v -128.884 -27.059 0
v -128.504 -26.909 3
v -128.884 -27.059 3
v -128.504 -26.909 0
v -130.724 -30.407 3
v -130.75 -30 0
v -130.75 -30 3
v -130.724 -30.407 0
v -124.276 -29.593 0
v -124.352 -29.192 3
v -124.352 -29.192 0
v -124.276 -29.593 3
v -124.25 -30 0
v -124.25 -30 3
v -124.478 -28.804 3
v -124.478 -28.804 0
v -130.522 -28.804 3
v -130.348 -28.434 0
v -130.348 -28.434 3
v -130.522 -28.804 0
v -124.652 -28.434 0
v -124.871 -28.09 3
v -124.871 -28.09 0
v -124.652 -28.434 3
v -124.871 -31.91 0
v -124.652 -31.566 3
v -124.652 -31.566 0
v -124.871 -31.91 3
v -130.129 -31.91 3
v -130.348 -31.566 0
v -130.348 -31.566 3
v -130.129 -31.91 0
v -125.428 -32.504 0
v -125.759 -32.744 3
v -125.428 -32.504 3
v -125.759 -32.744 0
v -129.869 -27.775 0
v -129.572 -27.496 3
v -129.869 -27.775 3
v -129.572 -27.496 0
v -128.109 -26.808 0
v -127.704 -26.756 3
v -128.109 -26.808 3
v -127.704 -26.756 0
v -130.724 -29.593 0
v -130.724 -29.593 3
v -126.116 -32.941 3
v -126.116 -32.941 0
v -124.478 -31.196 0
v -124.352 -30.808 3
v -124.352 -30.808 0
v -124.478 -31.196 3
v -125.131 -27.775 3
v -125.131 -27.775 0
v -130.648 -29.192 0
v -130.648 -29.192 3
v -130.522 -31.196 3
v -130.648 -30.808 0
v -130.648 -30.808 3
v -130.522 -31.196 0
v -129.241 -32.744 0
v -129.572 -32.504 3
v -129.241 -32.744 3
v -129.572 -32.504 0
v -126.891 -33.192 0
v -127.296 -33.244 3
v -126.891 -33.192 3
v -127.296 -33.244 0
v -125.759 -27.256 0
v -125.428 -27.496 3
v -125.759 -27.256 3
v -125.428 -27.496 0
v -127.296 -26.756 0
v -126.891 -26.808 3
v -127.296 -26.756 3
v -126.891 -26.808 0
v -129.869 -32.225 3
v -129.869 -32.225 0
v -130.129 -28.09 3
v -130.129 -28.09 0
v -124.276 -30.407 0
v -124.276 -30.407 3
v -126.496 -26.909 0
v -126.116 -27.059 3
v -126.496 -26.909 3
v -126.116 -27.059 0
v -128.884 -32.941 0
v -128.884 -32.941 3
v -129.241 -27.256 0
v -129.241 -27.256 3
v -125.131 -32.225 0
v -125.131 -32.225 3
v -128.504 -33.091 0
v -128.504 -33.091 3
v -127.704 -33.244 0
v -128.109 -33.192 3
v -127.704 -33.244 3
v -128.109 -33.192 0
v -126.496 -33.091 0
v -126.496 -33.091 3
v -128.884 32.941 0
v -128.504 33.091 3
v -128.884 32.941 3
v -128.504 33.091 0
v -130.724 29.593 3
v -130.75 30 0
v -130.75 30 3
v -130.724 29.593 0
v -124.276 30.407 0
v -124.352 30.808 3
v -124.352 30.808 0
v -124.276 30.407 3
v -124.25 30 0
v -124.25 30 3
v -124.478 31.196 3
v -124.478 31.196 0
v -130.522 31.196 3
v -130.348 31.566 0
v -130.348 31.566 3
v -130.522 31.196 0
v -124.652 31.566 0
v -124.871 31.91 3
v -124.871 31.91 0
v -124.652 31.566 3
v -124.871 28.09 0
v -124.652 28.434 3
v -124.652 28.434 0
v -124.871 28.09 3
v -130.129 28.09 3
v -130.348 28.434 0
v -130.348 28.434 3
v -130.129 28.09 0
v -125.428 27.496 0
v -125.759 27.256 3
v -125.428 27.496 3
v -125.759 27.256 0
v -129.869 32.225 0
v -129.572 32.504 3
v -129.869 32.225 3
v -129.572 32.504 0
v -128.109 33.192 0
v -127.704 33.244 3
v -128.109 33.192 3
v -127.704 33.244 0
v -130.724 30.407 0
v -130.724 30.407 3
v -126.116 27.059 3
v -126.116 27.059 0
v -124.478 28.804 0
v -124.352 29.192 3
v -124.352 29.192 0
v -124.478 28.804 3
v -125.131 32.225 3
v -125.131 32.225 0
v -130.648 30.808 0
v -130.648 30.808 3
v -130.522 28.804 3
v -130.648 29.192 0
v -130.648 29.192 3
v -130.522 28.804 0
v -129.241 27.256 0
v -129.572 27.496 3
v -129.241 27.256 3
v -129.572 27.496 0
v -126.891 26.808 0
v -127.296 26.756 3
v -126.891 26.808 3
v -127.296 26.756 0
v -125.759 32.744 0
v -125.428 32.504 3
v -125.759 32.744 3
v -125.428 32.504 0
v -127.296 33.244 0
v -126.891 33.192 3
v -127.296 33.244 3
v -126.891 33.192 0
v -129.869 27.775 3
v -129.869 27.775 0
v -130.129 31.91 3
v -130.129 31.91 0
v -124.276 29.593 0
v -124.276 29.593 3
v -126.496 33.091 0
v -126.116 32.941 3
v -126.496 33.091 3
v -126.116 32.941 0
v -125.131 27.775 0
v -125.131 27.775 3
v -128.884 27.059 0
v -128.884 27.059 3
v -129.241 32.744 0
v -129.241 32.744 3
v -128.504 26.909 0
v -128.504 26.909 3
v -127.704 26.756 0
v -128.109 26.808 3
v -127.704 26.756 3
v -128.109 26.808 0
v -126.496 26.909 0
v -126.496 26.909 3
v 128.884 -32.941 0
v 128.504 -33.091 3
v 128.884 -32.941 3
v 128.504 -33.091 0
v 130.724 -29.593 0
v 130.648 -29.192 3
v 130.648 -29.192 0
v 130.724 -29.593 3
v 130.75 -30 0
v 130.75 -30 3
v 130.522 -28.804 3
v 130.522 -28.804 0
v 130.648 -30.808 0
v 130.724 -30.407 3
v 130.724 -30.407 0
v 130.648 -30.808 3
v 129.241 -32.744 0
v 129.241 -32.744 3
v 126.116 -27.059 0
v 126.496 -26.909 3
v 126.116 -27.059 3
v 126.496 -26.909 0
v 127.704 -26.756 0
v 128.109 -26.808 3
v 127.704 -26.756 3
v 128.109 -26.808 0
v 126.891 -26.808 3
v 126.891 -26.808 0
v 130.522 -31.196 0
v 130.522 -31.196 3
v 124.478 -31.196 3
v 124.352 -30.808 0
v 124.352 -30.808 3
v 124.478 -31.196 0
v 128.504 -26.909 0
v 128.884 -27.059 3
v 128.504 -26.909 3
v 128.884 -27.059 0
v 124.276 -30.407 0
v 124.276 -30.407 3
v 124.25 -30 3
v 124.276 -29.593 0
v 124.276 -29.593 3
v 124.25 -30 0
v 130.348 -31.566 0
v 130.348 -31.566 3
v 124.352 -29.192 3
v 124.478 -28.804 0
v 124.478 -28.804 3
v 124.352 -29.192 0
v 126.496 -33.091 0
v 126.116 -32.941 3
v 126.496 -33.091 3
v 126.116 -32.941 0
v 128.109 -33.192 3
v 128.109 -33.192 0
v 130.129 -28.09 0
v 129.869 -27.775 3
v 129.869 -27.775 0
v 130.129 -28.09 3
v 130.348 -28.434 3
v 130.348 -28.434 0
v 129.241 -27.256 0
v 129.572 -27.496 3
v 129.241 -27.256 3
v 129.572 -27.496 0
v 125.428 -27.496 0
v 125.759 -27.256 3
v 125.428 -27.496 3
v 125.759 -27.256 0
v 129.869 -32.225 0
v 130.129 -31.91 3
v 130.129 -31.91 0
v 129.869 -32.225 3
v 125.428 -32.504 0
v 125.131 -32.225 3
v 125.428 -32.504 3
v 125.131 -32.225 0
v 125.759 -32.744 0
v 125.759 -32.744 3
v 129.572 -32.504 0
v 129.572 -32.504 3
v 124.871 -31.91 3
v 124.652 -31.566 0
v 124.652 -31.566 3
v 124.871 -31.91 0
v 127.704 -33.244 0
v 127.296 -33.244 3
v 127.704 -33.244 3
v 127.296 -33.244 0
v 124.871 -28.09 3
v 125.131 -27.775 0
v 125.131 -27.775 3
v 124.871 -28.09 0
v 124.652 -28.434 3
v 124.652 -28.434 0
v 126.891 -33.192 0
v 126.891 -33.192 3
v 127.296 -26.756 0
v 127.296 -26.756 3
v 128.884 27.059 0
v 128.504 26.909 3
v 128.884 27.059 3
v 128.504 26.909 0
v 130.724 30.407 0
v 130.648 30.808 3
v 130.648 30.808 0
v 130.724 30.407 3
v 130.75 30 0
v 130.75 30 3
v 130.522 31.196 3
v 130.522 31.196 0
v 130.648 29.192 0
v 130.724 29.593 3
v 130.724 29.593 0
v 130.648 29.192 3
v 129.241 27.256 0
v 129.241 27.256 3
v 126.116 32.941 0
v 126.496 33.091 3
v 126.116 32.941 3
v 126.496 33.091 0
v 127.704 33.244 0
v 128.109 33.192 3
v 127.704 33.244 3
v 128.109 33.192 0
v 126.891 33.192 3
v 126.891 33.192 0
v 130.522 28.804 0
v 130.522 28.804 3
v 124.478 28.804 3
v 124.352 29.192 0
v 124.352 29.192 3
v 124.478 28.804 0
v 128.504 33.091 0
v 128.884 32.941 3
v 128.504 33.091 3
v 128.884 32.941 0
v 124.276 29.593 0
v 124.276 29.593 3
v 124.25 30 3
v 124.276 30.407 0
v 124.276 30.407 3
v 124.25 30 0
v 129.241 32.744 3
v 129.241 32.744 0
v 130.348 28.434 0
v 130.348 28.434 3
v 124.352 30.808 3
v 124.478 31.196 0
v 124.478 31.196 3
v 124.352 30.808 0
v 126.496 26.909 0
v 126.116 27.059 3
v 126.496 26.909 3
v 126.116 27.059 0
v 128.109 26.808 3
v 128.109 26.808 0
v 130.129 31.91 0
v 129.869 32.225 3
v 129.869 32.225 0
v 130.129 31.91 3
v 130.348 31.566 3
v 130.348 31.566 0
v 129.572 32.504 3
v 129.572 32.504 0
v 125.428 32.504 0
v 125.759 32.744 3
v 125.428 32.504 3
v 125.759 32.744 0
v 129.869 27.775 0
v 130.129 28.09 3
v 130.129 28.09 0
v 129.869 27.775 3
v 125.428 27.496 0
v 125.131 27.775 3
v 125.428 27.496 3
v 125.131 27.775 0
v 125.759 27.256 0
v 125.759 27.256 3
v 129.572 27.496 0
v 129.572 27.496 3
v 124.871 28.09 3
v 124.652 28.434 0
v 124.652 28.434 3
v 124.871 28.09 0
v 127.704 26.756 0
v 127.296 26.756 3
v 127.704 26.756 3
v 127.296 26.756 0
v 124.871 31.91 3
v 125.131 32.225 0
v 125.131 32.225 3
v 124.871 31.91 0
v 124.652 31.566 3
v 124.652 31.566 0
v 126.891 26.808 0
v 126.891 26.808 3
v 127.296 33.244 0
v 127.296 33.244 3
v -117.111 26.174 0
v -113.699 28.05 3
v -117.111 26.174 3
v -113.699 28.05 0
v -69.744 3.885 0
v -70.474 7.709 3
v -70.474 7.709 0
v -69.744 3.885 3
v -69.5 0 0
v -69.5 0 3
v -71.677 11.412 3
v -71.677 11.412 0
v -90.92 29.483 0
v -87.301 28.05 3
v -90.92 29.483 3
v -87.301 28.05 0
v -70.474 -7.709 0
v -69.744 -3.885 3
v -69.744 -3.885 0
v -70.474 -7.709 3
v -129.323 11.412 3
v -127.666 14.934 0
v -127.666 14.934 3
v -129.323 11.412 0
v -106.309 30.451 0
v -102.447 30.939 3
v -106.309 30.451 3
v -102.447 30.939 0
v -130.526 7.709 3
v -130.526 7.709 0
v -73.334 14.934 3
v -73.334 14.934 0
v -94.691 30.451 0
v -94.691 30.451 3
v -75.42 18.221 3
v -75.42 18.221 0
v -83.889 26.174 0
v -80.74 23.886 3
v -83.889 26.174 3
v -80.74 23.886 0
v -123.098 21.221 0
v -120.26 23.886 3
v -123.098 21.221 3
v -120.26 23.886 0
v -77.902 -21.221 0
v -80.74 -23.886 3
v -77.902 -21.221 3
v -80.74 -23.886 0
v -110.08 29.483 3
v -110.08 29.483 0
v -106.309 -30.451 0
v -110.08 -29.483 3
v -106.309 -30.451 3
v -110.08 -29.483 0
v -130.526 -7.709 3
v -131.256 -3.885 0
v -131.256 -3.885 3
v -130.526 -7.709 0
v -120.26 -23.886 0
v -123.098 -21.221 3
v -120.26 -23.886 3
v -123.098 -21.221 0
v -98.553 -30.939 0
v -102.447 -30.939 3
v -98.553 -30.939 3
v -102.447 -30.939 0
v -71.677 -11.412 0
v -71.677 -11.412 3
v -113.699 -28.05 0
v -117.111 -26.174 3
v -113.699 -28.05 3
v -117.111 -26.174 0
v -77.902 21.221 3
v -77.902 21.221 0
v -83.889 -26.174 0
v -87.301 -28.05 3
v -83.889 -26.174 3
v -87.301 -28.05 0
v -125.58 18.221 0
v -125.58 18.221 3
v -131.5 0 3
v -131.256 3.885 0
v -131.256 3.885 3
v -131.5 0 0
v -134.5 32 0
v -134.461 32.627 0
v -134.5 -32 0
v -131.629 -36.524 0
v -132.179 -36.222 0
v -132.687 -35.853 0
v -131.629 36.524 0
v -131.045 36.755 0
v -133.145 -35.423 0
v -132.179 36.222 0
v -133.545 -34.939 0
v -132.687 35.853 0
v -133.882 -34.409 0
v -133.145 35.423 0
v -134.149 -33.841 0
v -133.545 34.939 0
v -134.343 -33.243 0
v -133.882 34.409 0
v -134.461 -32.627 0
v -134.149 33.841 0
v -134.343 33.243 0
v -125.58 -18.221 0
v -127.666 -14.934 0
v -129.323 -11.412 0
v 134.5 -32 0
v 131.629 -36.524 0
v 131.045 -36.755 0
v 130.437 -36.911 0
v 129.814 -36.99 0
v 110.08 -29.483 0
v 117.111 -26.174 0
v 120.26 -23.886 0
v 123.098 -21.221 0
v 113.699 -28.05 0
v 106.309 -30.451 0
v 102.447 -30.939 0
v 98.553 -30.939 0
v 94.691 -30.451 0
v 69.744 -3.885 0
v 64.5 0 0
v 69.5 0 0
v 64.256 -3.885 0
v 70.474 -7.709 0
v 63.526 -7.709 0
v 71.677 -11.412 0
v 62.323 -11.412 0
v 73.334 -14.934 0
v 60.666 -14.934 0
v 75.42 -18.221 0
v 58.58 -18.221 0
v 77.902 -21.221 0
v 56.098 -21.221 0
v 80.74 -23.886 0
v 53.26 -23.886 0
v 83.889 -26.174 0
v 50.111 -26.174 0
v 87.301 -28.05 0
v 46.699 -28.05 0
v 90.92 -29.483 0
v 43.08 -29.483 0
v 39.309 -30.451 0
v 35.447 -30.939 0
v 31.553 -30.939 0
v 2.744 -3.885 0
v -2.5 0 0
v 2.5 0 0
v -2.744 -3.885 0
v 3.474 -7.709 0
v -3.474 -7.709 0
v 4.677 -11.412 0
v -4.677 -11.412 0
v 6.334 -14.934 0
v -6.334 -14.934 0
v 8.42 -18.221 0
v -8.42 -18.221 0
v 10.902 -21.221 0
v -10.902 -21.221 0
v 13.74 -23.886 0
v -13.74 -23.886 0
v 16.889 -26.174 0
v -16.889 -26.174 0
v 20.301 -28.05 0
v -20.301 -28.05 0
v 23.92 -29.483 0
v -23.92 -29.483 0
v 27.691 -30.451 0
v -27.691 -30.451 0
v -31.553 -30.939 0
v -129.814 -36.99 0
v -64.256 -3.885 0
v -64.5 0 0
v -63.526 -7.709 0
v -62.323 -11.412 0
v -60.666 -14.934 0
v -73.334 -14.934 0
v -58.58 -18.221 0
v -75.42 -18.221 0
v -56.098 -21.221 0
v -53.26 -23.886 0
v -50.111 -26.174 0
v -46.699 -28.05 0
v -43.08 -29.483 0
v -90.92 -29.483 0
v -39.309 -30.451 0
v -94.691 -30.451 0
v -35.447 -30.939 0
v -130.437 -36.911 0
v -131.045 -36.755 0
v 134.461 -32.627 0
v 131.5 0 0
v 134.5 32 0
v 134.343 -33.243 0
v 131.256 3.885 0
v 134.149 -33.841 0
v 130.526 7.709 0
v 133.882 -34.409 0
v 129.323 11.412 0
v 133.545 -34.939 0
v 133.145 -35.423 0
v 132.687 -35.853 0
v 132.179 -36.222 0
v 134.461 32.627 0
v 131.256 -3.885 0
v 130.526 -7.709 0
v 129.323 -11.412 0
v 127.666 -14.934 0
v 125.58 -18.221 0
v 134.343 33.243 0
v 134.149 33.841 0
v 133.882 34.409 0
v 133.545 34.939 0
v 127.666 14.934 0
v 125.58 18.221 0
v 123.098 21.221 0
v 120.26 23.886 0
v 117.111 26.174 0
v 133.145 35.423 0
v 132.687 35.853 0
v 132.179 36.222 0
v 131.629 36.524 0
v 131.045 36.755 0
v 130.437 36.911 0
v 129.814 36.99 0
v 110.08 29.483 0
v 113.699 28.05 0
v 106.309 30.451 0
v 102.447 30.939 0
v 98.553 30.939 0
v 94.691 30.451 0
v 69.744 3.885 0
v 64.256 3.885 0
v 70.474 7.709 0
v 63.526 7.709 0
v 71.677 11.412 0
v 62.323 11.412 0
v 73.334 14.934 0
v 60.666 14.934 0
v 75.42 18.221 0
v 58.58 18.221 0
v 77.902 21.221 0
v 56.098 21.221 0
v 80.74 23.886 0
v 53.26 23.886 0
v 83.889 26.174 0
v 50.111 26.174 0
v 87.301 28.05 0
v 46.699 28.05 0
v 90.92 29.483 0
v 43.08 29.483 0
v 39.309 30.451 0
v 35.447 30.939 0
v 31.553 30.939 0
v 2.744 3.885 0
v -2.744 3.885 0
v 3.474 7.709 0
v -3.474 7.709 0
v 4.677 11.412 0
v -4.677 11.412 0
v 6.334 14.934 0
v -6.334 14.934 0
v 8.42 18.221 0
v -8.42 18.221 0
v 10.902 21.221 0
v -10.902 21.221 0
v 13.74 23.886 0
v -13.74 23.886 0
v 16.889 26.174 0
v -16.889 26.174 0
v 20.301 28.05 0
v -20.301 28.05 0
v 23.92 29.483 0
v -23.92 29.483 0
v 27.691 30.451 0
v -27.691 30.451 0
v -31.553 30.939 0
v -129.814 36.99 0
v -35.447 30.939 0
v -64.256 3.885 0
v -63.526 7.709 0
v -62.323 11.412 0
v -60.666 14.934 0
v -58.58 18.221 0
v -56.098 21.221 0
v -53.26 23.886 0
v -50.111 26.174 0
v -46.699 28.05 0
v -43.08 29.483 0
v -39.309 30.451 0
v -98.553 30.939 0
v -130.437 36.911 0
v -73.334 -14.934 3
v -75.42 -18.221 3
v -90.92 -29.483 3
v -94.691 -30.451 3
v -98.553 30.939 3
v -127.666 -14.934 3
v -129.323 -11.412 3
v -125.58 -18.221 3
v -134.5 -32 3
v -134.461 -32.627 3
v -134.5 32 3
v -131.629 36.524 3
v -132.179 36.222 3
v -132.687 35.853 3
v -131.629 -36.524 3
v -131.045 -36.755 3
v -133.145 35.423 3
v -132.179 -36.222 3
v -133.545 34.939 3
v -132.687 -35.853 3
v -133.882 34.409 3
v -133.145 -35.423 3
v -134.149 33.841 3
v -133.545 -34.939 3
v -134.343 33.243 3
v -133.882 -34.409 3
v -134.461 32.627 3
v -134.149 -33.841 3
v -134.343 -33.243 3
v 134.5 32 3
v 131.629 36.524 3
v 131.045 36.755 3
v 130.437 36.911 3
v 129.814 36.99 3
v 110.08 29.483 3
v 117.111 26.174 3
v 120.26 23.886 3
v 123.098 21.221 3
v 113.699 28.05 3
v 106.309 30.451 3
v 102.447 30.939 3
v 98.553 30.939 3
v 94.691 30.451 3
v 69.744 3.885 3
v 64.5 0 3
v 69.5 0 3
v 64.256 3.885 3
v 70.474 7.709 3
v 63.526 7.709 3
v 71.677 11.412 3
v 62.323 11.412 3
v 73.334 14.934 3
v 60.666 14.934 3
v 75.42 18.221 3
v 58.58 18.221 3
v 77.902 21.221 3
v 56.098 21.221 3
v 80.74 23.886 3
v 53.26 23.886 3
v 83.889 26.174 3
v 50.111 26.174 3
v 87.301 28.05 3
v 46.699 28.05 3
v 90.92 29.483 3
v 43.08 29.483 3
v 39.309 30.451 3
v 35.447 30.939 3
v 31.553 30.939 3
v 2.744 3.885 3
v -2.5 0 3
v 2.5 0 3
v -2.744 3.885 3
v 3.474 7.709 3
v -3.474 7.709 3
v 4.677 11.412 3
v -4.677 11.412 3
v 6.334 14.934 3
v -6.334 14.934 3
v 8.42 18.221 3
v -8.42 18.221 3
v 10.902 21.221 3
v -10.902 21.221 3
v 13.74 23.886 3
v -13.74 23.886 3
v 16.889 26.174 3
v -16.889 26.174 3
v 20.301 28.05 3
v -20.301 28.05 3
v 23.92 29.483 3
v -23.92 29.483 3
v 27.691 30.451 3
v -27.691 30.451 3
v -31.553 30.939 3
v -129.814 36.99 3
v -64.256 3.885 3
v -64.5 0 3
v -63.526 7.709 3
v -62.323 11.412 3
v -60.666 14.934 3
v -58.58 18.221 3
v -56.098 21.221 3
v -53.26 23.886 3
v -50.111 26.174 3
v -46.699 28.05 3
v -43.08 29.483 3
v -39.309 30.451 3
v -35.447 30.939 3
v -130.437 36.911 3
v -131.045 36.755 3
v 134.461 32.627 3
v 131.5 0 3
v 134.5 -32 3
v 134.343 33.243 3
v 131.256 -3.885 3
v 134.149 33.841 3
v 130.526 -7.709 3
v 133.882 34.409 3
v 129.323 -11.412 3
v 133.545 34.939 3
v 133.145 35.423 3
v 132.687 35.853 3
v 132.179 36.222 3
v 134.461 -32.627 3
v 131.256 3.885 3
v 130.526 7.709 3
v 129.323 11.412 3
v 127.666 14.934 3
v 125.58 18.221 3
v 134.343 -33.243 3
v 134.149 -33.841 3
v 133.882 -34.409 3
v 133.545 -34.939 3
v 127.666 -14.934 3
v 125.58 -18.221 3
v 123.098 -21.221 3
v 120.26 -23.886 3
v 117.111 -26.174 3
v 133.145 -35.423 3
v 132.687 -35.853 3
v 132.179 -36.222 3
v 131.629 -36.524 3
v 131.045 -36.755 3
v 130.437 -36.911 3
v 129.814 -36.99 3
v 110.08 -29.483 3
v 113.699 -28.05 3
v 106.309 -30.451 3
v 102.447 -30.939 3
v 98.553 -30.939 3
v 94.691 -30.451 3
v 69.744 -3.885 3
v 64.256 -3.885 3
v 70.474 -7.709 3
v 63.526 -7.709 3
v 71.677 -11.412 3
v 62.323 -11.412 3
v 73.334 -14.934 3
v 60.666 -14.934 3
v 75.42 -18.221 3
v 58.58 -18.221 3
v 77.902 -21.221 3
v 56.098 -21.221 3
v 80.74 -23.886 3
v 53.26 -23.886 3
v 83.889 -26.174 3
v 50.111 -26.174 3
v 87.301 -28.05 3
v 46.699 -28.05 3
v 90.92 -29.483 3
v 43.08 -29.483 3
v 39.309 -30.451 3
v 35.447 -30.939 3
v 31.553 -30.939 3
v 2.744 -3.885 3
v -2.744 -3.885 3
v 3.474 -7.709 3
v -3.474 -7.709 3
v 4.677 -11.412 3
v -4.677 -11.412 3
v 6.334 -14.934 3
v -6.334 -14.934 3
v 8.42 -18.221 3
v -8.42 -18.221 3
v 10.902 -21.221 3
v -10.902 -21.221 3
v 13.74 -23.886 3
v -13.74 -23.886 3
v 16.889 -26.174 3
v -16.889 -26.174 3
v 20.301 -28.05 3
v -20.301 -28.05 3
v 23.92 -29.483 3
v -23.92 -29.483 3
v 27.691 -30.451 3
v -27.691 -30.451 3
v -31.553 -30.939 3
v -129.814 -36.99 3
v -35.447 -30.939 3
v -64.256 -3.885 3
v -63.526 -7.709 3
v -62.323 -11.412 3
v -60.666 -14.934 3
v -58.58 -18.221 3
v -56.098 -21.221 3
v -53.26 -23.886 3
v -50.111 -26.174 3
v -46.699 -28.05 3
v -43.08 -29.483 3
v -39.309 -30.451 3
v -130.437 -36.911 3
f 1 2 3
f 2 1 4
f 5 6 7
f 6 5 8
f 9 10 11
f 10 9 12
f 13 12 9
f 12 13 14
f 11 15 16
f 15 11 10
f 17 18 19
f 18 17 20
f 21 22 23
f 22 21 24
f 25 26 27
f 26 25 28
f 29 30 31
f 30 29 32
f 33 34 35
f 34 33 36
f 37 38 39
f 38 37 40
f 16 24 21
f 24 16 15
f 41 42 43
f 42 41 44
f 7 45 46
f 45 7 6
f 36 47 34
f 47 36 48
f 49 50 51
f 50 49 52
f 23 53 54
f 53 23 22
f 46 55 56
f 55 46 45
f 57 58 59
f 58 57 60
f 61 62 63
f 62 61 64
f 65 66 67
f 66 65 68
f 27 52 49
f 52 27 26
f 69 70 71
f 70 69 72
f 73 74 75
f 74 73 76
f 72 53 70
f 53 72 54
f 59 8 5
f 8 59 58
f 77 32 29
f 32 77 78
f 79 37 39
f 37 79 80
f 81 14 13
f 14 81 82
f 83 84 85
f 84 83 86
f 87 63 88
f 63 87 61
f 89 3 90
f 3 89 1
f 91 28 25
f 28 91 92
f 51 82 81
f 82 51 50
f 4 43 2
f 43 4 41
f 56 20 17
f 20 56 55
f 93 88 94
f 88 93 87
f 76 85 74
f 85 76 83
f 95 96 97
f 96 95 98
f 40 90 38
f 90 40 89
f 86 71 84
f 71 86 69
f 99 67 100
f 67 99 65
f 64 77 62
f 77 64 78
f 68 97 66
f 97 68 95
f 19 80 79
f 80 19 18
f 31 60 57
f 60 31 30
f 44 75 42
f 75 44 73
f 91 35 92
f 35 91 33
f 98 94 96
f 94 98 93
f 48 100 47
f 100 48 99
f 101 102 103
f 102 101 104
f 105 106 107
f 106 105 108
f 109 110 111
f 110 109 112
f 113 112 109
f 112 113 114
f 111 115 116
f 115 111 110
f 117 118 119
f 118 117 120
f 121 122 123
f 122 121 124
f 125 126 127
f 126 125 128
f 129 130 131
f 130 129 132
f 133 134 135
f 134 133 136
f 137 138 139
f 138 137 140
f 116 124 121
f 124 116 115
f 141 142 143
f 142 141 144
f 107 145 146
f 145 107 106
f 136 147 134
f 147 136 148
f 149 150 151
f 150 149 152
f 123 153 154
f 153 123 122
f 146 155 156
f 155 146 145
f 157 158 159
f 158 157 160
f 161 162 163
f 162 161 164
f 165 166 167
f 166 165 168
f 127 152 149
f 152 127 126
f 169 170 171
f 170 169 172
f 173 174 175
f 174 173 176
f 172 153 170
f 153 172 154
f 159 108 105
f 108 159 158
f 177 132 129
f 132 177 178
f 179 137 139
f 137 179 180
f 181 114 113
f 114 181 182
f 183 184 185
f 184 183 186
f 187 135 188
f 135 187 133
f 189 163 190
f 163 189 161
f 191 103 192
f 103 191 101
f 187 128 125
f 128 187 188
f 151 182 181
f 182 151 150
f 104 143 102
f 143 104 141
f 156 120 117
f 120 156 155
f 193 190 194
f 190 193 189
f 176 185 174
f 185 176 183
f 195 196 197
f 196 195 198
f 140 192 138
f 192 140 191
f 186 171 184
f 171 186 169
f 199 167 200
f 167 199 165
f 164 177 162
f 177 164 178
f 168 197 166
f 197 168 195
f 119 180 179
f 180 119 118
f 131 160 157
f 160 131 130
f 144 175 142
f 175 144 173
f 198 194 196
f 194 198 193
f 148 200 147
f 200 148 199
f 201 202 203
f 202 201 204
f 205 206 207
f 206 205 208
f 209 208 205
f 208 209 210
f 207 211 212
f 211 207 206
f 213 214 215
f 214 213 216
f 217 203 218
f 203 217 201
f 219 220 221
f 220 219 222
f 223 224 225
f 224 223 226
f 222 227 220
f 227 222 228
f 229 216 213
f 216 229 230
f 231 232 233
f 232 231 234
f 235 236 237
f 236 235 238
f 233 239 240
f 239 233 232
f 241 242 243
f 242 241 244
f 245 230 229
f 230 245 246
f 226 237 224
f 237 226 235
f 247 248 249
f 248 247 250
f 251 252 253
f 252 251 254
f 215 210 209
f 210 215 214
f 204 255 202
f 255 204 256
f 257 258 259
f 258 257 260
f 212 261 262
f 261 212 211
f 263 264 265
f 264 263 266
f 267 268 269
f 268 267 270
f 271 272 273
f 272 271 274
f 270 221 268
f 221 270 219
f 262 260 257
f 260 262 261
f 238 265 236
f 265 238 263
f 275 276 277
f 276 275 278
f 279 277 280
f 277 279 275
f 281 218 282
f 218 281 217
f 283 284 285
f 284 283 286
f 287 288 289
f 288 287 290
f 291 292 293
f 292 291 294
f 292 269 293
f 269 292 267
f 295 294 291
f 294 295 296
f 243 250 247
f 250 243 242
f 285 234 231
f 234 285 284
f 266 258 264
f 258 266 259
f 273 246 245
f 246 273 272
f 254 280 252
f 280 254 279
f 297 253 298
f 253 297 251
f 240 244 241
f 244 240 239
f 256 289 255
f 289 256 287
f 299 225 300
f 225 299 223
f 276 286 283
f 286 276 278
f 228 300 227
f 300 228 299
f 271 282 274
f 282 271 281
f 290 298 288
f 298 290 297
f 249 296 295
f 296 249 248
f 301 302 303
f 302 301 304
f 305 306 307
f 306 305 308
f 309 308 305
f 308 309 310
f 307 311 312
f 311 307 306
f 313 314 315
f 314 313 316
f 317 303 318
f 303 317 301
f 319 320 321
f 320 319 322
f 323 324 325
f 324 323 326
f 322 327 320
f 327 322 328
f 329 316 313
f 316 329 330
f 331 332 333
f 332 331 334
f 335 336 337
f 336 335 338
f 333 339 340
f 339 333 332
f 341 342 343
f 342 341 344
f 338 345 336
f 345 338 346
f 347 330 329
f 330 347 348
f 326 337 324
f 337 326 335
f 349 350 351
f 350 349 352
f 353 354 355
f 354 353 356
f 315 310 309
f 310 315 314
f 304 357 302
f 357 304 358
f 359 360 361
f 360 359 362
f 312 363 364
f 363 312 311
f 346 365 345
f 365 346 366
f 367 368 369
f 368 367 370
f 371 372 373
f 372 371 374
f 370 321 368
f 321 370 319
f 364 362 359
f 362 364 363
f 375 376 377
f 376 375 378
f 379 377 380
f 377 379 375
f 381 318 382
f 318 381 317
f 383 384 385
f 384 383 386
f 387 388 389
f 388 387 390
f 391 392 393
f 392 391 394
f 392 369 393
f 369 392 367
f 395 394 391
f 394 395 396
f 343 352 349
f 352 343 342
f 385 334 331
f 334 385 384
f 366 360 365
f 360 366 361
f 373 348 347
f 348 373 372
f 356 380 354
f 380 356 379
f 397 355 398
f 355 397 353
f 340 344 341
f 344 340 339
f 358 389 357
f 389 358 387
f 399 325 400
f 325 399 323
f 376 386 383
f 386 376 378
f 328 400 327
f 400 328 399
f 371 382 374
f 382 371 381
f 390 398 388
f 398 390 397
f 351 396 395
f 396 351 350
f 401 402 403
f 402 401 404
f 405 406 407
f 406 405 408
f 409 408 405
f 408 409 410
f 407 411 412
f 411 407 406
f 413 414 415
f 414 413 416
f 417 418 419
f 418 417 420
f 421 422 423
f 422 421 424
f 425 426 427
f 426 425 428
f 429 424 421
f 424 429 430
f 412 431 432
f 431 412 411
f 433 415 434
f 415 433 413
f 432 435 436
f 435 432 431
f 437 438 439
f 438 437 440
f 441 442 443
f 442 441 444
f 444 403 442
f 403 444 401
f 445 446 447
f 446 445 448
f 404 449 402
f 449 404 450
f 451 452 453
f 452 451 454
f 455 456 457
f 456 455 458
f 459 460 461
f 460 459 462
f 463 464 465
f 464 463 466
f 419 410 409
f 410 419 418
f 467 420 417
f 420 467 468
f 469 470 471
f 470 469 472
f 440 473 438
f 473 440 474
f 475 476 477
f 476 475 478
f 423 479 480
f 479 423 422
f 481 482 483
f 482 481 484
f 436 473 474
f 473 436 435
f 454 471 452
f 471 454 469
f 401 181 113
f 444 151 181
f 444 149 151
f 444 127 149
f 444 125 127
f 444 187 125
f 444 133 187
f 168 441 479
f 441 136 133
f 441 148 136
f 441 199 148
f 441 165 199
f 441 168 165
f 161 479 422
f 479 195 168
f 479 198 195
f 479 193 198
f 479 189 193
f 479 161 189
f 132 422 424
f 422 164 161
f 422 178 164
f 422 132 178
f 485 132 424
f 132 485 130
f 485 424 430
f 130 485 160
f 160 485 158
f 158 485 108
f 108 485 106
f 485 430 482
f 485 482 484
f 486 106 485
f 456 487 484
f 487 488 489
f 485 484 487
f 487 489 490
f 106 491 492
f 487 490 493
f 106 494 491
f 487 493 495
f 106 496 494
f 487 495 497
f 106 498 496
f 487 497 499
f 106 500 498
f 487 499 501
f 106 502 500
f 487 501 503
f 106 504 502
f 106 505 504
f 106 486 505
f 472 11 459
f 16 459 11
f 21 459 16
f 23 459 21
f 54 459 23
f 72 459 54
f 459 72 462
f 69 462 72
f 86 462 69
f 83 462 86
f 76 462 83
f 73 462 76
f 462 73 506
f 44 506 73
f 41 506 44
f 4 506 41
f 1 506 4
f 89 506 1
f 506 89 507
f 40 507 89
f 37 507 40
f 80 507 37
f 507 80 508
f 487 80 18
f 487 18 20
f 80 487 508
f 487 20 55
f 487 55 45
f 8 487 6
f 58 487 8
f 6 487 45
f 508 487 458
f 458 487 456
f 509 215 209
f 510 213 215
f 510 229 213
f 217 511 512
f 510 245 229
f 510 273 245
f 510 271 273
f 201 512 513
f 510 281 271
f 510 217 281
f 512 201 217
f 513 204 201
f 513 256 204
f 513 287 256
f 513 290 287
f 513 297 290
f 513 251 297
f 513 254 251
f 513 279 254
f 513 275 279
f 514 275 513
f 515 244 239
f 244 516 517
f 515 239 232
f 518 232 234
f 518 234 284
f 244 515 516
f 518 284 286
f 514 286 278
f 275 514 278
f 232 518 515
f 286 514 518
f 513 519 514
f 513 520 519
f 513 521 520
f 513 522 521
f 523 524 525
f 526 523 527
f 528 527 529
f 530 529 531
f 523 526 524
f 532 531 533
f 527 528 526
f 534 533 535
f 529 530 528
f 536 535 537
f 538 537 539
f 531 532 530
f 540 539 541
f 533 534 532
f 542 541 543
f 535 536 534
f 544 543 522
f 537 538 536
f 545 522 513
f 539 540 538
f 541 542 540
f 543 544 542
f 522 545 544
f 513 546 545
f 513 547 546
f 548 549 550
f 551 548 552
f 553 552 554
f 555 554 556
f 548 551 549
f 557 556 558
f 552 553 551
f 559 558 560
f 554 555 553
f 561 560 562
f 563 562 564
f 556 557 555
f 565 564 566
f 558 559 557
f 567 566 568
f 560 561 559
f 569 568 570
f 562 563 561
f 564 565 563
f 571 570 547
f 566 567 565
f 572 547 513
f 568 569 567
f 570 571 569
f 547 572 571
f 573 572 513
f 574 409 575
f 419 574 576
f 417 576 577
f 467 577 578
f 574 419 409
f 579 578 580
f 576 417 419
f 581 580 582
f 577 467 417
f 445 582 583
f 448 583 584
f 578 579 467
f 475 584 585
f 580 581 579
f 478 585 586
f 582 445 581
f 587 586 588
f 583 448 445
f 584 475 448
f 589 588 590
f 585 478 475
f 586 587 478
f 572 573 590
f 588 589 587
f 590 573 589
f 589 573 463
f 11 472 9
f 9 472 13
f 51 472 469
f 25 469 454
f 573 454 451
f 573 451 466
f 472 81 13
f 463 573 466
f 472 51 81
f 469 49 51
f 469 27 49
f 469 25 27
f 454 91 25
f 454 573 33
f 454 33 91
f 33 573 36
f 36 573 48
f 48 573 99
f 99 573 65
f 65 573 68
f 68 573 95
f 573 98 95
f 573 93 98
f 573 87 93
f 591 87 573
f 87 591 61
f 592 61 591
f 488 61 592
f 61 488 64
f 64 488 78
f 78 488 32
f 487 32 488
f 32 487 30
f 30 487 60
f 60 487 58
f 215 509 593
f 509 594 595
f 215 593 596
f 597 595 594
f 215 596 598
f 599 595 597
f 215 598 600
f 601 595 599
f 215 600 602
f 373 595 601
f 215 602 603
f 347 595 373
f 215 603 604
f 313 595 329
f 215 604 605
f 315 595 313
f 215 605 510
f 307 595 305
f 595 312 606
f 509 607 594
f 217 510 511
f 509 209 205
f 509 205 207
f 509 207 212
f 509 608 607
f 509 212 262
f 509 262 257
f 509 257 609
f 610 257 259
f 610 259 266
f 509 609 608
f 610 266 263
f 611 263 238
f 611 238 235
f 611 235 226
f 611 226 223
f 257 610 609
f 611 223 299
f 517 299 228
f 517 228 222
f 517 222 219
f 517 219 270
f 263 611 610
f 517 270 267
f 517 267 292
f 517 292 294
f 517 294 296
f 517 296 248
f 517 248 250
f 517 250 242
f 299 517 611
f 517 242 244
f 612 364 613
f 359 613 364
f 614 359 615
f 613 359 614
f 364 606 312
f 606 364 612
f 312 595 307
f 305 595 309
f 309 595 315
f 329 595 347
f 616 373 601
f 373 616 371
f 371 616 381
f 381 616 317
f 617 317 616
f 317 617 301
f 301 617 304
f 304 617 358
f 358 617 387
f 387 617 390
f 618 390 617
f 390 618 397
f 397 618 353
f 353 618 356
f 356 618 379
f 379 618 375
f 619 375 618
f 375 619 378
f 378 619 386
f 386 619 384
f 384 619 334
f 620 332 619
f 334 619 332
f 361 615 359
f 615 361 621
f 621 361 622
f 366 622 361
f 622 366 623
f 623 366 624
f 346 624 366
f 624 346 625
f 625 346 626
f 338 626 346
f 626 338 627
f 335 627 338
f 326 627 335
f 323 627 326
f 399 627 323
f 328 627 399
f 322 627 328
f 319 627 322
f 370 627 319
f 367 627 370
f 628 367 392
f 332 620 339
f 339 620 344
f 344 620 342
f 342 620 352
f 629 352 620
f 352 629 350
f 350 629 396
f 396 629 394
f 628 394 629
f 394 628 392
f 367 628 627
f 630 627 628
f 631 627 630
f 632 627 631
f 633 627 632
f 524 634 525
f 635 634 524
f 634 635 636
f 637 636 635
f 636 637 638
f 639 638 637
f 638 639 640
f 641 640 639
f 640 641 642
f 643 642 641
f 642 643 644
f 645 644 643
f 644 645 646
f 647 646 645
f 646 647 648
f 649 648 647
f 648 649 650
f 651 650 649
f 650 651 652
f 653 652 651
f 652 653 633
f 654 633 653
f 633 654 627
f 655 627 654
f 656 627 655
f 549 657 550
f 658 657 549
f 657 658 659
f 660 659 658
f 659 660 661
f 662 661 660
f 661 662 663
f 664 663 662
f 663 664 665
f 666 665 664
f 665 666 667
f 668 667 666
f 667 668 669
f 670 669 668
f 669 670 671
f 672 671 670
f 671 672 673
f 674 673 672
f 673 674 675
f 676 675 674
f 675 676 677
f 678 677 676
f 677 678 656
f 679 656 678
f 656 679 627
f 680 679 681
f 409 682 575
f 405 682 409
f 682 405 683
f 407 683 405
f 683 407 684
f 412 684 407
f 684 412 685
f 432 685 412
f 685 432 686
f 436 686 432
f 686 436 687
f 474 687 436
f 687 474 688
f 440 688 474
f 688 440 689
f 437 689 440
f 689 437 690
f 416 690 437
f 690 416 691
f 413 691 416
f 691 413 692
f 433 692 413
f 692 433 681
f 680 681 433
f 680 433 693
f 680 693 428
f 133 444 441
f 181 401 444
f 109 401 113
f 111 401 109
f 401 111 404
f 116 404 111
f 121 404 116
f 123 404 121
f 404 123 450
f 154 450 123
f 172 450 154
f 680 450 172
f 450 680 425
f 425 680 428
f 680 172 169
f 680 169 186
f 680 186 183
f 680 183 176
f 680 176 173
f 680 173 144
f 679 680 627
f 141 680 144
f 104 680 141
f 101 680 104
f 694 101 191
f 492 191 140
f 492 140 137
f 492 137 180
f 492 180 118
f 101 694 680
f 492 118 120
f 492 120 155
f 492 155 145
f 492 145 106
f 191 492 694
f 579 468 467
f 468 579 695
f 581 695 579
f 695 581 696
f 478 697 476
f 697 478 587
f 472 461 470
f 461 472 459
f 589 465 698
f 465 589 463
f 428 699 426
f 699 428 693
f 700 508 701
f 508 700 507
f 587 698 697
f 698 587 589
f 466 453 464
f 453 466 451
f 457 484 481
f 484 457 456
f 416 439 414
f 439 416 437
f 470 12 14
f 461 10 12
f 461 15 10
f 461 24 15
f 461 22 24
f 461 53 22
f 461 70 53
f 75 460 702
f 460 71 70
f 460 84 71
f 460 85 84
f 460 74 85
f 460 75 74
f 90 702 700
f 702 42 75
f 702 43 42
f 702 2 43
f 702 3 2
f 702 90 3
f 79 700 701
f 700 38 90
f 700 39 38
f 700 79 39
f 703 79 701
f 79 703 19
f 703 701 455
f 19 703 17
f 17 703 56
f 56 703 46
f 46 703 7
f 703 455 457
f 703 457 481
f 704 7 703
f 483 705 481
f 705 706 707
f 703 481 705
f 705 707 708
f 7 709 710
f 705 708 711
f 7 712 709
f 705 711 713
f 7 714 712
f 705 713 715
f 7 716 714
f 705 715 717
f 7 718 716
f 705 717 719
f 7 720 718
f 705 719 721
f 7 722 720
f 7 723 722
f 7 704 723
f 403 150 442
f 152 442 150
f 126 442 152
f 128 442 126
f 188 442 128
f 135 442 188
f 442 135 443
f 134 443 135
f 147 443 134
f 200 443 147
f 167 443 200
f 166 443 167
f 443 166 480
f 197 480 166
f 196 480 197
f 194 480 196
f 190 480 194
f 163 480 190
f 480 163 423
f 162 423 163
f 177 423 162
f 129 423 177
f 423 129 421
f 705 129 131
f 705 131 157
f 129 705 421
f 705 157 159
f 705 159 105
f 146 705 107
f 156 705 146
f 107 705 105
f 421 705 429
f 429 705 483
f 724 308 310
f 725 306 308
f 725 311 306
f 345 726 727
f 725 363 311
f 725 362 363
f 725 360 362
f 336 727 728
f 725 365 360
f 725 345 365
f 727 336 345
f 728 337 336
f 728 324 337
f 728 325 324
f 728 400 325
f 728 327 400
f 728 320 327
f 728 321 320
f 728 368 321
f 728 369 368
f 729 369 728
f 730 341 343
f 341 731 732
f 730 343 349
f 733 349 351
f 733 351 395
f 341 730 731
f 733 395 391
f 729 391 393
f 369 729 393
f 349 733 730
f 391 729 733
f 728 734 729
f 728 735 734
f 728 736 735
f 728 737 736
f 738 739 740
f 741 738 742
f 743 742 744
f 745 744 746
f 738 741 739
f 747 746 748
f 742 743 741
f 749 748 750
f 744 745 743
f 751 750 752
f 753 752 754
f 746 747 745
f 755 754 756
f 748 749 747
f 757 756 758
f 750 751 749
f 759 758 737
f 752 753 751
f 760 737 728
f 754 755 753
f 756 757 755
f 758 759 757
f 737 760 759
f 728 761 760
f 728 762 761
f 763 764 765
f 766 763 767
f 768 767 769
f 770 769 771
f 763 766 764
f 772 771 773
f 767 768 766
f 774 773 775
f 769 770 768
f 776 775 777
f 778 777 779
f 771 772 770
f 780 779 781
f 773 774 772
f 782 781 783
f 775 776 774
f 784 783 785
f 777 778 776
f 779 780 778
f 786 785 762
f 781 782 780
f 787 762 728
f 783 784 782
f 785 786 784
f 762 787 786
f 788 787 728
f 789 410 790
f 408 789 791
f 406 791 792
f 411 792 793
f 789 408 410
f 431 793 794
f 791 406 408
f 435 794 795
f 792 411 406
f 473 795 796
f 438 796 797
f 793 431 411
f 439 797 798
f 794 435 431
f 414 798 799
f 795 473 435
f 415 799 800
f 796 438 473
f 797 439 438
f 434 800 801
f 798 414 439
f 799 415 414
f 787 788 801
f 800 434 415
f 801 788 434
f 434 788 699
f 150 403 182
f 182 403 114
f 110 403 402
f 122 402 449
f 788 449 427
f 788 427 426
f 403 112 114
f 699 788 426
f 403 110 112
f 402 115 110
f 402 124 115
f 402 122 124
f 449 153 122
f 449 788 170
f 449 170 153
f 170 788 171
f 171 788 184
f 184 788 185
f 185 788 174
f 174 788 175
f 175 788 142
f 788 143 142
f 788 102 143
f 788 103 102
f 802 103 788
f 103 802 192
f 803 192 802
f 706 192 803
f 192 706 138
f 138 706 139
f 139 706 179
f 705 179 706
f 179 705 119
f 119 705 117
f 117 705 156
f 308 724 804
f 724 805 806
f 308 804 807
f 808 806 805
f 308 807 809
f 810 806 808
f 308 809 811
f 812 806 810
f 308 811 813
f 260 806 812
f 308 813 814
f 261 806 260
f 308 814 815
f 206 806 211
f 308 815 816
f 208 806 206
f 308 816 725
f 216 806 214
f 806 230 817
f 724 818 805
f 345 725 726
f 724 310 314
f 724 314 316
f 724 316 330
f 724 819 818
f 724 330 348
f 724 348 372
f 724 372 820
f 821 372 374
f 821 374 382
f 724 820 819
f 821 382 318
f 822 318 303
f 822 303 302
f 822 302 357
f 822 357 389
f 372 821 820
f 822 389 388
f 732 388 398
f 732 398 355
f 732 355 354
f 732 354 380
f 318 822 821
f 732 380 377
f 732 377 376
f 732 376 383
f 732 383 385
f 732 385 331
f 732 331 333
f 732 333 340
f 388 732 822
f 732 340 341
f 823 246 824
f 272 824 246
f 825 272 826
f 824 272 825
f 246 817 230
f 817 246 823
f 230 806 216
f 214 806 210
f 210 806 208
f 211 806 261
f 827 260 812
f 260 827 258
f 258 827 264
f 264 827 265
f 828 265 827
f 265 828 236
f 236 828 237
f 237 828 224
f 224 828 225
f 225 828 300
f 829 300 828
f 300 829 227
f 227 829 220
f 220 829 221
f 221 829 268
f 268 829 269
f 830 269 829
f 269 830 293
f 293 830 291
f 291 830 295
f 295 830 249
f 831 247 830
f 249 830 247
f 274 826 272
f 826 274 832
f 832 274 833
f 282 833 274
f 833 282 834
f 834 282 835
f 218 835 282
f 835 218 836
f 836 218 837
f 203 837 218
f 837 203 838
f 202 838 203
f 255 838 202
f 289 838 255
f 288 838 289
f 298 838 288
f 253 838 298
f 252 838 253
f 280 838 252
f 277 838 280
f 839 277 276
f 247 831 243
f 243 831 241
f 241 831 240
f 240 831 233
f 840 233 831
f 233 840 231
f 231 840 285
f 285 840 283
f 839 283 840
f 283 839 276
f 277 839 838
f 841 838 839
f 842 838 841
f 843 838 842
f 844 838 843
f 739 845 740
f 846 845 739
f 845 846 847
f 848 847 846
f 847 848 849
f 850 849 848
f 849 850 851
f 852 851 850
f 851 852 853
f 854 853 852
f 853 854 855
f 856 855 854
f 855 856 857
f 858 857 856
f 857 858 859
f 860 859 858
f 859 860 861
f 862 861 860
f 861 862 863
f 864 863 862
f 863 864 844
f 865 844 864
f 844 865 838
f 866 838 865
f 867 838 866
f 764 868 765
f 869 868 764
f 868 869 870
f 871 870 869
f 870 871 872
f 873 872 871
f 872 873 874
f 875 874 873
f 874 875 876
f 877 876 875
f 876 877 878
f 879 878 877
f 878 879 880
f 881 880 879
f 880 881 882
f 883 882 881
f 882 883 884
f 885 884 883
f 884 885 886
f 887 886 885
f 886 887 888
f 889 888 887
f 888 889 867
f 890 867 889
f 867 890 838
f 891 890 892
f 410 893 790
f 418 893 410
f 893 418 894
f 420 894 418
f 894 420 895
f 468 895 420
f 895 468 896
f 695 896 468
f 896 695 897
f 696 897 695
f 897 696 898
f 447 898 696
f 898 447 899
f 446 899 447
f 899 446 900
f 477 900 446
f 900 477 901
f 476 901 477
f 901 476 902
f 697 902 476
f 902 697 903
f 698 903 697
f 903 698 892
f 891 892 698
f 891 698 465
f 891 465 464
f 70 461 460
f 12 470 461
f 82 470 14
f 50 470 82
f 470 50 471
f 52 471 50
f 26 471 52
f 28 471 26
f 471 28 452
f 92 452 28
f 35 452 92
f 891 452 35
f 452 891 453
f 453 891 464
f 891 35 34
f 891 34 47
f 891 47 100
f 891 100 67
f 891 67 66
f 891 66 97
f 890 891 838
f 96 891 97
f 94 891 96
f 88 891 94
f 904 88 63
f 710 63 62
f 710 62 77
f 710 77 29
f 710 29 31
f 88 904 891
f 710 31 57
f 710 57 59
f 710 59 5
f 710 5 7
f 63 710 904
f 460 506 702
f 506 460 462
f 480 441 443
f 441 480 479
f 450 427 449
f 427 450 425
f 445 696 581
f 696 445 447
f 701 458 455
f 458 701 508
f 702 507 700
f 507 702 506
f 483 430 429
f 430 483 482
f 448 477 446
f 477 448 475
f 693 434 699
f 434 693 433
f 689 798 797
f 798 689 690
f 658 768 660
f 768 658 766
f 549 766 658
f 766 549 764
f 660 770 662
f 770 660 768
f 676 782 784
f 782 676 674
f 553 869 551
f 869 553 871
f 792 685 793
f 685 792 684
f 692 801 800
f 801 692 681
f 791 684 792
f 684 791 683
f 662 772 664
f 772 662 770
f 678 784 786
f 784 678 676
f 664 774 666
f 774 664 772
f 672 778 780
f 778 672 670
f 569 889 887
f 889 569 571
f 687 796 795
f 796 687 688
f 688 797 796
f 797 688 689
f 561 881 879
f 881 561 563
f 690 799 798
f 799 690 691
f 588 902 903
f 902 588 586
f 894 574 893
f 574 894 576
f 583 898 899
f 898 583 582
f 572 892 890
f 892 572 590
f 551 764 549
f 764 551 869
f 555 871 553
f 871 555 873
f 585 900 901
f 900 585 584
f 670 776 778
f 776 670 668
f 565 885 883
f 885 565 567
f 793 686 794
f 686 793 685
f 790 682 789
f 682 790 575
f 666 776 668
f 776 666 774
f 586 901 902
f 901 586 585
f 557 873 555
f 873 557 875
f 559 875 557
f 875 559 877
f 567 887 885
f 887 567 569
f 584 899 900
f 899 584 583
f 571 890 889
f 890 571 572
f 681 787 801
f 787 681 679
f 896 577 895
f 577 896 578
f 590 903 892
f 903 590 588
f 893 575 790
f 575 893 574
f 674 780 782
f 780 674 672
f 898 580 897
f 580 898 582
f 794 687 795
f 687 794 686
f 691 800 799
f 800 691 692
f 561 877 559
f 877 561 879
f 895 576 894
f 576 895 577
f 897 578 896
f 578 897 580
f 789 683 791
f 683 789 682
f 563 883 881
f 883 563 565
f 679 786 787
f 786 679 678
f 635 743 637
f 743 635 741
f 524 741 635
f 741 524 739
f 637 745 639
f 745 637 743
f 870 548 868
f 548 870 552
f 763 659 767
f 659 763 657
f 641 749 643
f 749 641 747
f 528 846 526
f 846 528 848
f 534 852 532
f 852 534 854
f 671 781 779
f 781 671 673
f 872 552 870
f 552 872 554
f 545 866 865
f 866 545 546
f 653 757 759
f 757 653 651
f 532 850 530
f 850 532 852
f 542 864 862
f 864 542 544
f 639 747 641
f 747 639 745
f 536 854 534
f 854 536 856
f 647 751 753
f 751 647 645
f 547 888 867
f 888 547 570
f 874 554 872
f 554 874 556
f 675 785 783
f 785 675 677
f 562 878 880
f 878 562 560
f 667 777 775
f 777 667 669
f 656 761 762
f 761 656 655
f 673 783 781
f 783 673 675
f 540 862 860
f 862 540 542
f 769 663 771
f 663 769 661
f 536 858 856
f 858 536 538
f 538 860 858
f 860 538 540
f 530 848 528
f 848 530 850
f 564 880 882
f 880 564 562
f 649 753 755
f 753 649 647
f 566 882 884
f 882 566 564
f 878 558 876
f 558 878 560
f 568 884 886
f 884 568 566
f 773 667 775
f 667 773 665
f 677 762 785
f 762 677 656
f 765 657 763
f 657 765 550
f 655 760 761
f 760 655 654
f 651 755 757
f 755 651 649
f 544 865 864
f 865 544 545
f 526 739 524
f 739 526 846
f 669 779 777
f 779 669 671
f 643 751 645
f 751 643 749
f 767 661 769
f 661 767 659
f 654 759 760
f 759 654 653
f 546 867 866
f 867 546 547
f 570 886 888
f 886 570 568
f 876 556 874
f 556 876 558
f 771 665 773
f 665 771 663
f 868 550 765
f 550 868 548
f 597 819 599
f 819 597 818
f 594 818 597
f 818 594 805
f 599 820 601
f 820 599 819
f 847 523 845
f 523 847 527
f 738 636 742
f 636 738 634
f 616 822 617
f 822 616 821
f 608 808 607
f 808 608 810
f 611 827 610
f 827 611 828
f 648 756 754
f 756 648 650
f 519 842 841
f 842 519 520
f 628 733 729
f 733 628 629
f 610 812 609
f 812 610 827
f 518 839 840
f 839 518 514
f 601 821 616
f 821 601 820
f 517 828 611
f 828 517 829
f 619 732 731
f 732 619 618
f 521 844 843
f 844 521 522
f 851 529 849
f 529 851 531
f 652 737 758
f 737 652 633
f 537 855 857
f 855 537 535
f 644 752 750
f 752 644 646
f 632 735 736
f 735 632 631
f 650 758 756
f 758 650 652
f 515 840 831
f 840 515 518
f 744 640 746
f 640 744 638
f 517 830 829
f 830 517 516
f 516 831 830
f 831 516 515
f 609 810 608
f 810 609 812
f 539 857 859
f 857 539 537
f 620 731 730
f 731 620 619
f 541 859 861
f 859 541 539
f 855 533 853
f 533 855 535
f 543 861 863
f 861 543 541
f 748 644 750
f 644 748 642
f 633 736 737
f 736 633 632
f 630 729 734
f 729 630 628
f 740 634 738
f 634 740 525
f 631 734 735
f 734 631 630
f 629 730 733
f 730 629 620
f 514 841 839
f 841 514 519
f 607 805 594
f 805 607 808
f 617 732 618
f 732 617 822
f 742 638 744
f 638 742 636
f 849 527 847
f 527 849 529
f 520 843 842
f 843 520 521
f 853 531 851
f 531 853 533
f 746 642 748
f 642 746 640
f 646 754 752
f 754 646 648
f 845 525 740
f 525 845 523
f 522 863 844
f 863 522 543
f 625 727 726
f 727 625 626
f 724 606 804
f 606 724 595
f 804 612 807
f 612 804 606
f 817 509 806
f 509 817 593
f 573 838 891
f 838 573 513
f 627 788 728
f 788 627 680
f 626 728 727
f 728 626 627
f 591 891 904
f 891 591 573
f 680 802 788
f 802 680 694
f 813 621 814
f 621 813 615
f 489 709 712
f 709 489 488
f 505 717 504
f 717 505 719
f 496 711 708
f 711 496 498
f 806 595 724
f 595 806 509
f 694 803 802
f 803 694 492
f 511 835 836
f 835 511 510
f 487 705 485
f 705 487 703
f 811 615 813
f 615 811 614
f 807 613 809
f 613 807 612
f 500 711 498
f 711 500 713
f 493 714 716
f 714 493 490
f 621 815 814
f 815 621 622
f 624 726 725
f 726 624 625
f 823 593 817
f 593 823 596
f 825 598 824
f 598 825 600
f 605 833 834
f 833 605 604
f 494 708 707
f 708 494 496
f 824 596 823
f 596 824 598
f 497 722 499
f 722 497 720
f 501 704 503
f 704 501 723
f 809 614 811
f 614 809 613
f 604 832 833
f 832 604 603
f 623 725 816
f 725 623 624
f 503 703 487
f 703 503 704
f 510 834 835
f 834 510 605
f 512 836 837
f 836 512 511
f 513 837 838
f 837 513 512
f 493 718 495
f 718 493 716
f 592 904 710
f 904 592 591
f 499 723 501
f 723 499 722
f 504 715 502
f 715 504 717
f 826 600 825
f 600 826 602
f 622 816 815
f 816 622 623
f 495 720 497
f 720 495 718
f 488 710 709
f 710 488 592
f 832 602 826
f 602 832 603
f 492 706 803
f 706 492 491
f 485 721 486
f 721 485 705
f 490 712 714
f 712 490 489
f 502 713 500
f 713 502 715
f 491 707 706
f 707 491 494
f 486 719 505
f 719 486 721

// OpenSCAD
$fn = 50;

difference() {
	union() {
		hull() {
			translate(v = [-129.5, 32.0, 0]) {
				cylinder(h = 3, r = 5);
			}
			translate(v = [129.5, 32.0, 0]) {
				cylinder(h = 3, r = 5);
			}
			translate(v = [-129.5, -32.0, 0]) {
				cylinder(h = 3, r = 5);
			}
			translate(v = [129.5, -32.0, 0]) {
				cylinder(h = 3, r = 5);
			}
		}
	}
	union() {
		translate(v = [-127.5, -30.0, -100.0]) {
			cylinder(h = 200, r = 3.25);
		}
		translate(v = [-127.5, 30.0, -100.0]) {
			cylinder(h = 200, r = 3.25);
		}
		translate(v = [127.5, -30.0, -100.0]) {
			cylinder(h = 200, r = 3.25);
		}
		translate(v = [127.5, 30.0, -100.0]) {
			cylinder(h = 200, r = 3.25);
		}
		translate(v = [-127.5, -30.0, -100.0]) {
			cylinder(h = 200, r = 1.8);
		}
		translate(v = [-127.5, 30.0, -100.0]) {
			cylinder(h = 200, r = 1.8);
		}
		translate(v = [127.5, -30.0, -100.0]) {
			cylinder(h = 200, r = 1.8);
		}
		translate(v = [127.5, 30.0, -100.0]) {
			cylinder(h = 200, r = 1.8);
		}
		translate(v = [-100.5, 0, 0.0]) {
			cylinder(h = 3, r = 31.0);
		}
		translate(v = [-33.5, 0, 0.0]) {
			cylinder(h = 3, r = 31.0);
		}
		translate(v = [33.5, 0, 0.0]) {
			cylinder(h = 3, r = 31.0);
		}
		translate(v = [100.5, 0, 0.0]) {
			cylinder(h = 3, r = 31.0);
		}
	}
}
